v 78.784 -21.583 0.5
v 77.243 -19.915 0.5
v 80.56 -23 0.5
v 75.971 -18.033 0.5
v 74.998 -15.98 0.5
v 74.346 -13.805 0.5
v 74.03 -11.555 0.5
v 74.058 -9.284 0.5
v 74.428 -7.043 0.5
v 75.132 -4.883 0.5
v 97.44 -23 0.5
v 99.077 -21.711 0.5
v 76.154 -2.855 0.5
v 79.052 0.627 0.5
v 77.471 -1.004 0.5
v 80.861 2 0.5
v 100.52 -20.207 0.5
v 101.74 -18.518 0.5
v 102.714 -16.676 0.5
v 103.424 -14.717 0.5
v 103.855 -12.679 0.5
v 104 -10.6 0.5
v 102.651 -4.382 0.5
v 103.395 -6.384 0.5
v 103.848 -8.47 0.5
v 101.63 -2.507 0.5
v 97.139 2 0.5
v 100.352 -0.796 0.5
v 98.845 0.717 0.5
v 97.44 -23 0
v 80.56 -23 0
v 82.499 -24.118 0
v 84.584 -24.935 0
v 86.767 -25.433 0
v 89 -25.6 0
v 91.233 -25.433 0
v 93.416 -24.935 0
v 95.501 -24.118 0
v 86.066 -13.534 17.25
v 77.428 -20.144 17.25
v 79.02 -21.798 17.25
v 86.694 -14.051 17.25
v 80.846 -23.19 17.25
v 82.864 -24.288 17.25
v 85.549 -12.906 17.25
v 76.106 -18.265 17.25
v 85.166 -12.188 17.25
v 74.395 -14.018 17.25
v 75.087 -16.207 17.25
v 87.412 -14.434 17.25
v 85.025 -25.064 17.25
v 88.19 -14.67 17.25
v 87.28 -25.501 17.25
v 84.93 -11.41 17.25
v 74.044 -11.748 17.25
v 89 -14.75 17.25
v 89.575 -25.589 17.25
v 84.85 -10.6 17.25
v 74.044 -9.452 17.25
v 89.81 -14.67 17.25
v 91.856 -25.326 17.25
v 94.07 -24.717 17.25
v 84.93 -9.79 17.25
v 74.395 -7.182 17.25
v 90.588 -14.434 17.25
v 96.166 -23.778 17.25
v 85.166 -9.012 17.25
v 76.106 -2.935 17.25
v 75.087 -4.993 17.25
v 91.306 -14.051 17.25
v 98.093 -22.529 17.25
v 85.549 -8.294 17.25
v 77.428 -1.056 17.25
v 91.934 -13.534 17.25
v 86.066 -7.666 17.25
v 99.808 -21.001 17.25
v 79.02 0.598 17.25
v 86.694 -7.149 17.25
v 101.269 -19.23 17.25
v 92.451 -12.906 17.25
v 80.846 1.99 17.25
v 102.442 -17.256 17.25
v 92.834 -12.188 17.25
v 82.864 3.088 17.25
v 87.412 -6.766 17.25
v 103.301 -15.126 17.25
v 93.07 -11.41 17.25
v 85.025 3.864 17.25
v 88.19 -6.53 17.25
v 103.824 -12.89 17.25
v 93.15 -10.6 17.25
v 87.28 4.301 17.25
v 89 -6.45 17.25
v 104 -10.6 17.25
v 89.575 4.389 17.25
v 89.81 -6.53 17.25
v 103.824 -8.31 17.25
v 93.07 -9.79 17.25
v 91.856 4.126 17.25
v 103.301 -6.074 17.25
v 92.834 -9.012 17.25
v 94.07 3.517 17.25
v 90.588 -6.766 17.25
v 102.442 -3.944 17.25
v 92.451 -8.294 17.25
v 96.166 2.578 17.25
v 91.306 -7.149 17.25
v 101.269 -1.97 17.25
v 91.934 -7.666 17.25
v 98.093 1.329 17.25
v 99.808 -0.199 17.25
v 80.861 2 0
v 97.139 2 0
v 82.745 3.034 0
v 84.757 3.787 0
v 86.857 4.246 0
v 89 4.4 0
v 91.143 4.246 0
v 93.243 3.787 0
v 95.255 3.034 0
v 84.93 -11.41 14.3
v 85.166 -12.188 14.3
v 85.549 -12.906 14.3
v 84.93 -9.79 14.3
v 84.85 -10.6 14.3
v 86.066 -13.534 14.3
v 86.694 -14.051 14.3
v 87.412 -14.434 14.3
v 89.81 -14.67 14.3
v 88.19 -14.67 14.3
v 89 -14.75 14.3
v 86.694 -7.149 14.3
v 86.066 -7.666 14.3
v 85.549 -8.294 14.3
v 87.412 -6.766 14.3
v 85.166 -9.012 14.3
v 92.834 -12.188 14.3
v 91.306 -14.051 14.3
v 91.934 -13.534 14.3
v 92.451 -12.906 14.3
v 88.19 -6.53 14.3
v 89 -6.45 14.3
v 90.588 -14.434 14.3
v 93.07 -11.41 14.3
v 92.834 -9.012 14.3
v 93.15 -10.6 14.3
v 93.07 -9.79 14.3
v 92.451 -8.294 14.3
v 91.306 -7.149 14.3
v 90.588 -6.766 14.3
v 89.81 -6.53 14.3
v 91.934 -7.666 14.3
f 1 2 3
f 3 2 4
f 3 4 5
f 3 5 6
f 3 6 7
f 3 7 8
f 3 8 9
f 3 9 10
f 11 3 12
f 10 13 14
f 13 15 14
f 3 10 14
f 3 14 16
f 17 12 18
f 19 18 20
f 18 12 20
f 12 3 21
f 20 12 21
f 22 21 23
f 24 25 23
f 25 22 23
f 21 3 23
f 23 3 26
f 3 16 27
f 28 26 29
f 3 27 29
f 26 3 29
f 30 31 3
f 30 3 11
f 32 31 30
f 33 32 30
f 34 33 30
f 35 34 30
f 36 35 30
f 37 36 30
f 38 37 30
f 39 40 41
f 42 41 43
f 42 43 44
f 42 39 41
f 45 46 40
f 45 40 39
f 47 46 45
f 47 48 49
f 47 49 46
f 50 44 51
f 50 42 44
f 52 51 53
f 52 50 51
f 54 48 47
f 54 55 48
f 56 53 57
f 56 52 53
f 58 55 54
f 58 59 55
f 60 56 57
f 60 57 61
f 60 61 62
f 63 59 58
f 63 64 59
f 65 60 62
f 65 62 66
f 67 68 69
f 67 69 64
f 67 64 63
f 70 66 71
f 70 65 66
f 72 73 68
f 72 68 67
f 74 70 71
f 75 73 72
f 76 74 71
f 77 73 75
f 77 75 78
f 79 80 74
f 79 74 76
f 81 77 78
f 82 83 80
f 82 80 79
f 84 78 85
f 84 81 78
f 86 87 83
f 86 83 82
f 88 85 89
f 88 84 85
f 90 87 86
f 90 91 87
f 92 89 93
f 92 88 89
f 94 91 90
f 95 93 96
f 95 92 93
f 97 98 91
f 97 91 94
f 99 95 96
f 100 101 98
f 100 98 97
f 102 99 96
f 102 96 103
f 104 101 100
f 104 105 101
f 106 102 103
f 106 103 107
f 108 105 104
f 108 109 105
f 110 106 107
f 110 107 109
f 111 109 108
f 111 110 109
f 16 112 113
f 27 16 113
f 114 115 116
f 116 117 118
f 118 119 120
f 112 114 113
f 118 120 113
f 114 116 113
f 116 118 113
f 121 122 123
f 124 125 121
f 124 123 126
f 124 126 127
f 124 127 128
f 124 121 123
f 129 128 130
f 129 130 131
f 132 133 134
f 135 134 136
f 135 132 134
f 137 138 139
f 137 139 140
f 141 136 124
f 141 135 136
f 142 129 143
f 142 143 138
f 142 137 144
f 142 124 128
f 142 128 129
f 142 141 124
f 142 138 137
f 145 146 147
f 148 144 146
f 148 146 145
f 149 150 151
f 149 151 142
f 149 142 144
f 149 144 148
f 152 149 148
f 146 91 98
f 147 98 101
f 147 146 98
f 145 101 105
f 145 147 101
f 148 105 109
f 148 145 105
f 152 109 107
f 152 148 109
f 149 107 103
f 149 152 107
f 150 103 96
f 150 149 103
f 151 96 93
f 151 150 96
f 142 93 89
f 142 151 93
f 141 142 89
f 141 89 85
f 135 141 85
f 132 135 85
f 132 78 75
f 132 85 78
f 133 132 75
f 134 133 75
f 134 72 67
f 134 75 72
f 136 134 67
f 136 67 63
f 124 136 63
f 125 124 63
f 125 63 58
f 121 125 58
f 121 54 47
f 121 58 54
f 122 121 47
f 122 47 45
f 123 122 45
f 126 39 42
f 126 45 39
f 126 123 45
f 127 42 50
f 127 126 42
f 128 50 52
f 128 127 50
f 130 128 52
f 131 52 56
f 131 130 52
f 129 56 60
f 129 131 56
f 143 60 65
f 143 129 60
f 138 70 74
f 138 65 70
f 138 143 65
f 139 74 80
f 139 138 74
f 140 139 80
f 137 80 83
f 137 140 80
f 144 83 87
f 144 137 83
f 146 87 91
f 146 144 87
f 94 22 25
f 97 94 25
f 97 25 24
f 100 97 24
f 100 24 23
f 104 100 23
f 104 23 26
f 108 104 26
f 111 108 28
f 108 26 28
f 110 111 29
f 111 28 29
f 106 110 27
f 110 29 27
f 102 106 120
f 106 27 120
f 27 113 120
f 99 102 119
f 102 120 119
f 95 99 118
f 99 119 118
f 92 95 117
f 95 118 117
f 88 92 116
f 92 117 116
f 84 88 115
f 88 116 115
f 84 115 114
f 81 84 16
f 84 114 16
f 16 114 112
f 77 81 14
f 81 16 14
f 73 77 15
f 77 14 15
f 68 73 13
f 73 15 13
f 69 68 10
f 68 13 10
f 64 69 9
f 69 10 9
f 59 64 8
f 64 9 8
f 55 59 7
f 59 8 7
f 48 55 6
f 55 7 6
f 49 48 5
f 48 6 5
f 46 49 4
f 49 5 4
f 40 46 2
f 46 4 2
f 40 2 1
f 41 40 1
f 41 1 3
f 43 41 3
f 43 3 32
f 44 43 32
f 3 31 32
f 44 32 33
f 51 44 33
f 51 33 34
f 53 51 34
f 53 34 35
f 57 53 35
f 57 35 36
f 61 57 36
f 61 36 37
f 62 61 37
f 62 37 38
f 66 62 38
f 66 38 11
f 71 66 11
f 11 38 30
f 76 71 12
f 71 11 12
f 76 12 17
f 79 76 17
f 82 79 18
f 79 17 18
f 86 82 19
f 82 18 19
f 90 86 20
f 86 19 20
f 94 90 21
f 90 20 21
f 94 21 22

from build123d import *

# Parameters (mm, degrees)
BOX007_W                  = 50
BOX007_H                  = 25
BOX007_DEPTH              = 0.5
CYLINDER007_R             = 4.15
CYLINDER007_DEPTH         = 10
SKETCH006_R               = 15
EXTRUDE003003_DEPTH       = 17.25
CUT005013_PLACEMENT_ANGLE = 90


with BuildPart() as cube007:
    # Box007 → Box007 (new body)
    with BuildSketch(Plane(origin=(66, -23, 0), x_dir=(1, 0, 0), z_dir=(0, 0, 1))):
        with Locations((25, 12.5)):
            Rectangle(BOX007_W, BOX007_H)
    extrude(amount=BOX007_DEPTH)


with BuildPart() as iman_chico_fuerte001:
    # Cylinder007 → Cylinder007 (new body)
    with BuildSketch(Plane(origin=(89, -14.3, 10.4), x_dir=(1, 0, 0), z_dir=(0, -1, 0))):
        Circle(CYLINDER007_R)
    extrude(amount=CYLINDER007_DEPTH)


with BuildPart() as parte_pared_sin_corte_inclinado:
    # Sketch006 → Extrude003003 (new body)
    with BuildSketch(Plane.XZ):
        with Locations((89, 10.4)):
            Circle(SKETCH006_R)
    extrude(amount=EXTRUDE003003_DEPTH)

    # Cut005013: cut iman_chico_fuerte001
    add(iman_chico_fuerte001.part, mode=Mode.SUBTRACT)


with BuildPart() as parte_pared_sin_corte_inclinado_1:
    # Cut005013 placement: moved
    add(parte_pared_sin_corte_inclinado.part.moved(Location((0, -21, 0))).rotate(Axis((0, -21, 0), (-1, 0, 0)), CUT005013_PLACEMENT_ANGLE))

    # Cut005014: cut Cube007
    add(cube007.part, mode=Mode.SUBTRACT)


solid = parte_pared_sin_corte_inclinado_1.part
